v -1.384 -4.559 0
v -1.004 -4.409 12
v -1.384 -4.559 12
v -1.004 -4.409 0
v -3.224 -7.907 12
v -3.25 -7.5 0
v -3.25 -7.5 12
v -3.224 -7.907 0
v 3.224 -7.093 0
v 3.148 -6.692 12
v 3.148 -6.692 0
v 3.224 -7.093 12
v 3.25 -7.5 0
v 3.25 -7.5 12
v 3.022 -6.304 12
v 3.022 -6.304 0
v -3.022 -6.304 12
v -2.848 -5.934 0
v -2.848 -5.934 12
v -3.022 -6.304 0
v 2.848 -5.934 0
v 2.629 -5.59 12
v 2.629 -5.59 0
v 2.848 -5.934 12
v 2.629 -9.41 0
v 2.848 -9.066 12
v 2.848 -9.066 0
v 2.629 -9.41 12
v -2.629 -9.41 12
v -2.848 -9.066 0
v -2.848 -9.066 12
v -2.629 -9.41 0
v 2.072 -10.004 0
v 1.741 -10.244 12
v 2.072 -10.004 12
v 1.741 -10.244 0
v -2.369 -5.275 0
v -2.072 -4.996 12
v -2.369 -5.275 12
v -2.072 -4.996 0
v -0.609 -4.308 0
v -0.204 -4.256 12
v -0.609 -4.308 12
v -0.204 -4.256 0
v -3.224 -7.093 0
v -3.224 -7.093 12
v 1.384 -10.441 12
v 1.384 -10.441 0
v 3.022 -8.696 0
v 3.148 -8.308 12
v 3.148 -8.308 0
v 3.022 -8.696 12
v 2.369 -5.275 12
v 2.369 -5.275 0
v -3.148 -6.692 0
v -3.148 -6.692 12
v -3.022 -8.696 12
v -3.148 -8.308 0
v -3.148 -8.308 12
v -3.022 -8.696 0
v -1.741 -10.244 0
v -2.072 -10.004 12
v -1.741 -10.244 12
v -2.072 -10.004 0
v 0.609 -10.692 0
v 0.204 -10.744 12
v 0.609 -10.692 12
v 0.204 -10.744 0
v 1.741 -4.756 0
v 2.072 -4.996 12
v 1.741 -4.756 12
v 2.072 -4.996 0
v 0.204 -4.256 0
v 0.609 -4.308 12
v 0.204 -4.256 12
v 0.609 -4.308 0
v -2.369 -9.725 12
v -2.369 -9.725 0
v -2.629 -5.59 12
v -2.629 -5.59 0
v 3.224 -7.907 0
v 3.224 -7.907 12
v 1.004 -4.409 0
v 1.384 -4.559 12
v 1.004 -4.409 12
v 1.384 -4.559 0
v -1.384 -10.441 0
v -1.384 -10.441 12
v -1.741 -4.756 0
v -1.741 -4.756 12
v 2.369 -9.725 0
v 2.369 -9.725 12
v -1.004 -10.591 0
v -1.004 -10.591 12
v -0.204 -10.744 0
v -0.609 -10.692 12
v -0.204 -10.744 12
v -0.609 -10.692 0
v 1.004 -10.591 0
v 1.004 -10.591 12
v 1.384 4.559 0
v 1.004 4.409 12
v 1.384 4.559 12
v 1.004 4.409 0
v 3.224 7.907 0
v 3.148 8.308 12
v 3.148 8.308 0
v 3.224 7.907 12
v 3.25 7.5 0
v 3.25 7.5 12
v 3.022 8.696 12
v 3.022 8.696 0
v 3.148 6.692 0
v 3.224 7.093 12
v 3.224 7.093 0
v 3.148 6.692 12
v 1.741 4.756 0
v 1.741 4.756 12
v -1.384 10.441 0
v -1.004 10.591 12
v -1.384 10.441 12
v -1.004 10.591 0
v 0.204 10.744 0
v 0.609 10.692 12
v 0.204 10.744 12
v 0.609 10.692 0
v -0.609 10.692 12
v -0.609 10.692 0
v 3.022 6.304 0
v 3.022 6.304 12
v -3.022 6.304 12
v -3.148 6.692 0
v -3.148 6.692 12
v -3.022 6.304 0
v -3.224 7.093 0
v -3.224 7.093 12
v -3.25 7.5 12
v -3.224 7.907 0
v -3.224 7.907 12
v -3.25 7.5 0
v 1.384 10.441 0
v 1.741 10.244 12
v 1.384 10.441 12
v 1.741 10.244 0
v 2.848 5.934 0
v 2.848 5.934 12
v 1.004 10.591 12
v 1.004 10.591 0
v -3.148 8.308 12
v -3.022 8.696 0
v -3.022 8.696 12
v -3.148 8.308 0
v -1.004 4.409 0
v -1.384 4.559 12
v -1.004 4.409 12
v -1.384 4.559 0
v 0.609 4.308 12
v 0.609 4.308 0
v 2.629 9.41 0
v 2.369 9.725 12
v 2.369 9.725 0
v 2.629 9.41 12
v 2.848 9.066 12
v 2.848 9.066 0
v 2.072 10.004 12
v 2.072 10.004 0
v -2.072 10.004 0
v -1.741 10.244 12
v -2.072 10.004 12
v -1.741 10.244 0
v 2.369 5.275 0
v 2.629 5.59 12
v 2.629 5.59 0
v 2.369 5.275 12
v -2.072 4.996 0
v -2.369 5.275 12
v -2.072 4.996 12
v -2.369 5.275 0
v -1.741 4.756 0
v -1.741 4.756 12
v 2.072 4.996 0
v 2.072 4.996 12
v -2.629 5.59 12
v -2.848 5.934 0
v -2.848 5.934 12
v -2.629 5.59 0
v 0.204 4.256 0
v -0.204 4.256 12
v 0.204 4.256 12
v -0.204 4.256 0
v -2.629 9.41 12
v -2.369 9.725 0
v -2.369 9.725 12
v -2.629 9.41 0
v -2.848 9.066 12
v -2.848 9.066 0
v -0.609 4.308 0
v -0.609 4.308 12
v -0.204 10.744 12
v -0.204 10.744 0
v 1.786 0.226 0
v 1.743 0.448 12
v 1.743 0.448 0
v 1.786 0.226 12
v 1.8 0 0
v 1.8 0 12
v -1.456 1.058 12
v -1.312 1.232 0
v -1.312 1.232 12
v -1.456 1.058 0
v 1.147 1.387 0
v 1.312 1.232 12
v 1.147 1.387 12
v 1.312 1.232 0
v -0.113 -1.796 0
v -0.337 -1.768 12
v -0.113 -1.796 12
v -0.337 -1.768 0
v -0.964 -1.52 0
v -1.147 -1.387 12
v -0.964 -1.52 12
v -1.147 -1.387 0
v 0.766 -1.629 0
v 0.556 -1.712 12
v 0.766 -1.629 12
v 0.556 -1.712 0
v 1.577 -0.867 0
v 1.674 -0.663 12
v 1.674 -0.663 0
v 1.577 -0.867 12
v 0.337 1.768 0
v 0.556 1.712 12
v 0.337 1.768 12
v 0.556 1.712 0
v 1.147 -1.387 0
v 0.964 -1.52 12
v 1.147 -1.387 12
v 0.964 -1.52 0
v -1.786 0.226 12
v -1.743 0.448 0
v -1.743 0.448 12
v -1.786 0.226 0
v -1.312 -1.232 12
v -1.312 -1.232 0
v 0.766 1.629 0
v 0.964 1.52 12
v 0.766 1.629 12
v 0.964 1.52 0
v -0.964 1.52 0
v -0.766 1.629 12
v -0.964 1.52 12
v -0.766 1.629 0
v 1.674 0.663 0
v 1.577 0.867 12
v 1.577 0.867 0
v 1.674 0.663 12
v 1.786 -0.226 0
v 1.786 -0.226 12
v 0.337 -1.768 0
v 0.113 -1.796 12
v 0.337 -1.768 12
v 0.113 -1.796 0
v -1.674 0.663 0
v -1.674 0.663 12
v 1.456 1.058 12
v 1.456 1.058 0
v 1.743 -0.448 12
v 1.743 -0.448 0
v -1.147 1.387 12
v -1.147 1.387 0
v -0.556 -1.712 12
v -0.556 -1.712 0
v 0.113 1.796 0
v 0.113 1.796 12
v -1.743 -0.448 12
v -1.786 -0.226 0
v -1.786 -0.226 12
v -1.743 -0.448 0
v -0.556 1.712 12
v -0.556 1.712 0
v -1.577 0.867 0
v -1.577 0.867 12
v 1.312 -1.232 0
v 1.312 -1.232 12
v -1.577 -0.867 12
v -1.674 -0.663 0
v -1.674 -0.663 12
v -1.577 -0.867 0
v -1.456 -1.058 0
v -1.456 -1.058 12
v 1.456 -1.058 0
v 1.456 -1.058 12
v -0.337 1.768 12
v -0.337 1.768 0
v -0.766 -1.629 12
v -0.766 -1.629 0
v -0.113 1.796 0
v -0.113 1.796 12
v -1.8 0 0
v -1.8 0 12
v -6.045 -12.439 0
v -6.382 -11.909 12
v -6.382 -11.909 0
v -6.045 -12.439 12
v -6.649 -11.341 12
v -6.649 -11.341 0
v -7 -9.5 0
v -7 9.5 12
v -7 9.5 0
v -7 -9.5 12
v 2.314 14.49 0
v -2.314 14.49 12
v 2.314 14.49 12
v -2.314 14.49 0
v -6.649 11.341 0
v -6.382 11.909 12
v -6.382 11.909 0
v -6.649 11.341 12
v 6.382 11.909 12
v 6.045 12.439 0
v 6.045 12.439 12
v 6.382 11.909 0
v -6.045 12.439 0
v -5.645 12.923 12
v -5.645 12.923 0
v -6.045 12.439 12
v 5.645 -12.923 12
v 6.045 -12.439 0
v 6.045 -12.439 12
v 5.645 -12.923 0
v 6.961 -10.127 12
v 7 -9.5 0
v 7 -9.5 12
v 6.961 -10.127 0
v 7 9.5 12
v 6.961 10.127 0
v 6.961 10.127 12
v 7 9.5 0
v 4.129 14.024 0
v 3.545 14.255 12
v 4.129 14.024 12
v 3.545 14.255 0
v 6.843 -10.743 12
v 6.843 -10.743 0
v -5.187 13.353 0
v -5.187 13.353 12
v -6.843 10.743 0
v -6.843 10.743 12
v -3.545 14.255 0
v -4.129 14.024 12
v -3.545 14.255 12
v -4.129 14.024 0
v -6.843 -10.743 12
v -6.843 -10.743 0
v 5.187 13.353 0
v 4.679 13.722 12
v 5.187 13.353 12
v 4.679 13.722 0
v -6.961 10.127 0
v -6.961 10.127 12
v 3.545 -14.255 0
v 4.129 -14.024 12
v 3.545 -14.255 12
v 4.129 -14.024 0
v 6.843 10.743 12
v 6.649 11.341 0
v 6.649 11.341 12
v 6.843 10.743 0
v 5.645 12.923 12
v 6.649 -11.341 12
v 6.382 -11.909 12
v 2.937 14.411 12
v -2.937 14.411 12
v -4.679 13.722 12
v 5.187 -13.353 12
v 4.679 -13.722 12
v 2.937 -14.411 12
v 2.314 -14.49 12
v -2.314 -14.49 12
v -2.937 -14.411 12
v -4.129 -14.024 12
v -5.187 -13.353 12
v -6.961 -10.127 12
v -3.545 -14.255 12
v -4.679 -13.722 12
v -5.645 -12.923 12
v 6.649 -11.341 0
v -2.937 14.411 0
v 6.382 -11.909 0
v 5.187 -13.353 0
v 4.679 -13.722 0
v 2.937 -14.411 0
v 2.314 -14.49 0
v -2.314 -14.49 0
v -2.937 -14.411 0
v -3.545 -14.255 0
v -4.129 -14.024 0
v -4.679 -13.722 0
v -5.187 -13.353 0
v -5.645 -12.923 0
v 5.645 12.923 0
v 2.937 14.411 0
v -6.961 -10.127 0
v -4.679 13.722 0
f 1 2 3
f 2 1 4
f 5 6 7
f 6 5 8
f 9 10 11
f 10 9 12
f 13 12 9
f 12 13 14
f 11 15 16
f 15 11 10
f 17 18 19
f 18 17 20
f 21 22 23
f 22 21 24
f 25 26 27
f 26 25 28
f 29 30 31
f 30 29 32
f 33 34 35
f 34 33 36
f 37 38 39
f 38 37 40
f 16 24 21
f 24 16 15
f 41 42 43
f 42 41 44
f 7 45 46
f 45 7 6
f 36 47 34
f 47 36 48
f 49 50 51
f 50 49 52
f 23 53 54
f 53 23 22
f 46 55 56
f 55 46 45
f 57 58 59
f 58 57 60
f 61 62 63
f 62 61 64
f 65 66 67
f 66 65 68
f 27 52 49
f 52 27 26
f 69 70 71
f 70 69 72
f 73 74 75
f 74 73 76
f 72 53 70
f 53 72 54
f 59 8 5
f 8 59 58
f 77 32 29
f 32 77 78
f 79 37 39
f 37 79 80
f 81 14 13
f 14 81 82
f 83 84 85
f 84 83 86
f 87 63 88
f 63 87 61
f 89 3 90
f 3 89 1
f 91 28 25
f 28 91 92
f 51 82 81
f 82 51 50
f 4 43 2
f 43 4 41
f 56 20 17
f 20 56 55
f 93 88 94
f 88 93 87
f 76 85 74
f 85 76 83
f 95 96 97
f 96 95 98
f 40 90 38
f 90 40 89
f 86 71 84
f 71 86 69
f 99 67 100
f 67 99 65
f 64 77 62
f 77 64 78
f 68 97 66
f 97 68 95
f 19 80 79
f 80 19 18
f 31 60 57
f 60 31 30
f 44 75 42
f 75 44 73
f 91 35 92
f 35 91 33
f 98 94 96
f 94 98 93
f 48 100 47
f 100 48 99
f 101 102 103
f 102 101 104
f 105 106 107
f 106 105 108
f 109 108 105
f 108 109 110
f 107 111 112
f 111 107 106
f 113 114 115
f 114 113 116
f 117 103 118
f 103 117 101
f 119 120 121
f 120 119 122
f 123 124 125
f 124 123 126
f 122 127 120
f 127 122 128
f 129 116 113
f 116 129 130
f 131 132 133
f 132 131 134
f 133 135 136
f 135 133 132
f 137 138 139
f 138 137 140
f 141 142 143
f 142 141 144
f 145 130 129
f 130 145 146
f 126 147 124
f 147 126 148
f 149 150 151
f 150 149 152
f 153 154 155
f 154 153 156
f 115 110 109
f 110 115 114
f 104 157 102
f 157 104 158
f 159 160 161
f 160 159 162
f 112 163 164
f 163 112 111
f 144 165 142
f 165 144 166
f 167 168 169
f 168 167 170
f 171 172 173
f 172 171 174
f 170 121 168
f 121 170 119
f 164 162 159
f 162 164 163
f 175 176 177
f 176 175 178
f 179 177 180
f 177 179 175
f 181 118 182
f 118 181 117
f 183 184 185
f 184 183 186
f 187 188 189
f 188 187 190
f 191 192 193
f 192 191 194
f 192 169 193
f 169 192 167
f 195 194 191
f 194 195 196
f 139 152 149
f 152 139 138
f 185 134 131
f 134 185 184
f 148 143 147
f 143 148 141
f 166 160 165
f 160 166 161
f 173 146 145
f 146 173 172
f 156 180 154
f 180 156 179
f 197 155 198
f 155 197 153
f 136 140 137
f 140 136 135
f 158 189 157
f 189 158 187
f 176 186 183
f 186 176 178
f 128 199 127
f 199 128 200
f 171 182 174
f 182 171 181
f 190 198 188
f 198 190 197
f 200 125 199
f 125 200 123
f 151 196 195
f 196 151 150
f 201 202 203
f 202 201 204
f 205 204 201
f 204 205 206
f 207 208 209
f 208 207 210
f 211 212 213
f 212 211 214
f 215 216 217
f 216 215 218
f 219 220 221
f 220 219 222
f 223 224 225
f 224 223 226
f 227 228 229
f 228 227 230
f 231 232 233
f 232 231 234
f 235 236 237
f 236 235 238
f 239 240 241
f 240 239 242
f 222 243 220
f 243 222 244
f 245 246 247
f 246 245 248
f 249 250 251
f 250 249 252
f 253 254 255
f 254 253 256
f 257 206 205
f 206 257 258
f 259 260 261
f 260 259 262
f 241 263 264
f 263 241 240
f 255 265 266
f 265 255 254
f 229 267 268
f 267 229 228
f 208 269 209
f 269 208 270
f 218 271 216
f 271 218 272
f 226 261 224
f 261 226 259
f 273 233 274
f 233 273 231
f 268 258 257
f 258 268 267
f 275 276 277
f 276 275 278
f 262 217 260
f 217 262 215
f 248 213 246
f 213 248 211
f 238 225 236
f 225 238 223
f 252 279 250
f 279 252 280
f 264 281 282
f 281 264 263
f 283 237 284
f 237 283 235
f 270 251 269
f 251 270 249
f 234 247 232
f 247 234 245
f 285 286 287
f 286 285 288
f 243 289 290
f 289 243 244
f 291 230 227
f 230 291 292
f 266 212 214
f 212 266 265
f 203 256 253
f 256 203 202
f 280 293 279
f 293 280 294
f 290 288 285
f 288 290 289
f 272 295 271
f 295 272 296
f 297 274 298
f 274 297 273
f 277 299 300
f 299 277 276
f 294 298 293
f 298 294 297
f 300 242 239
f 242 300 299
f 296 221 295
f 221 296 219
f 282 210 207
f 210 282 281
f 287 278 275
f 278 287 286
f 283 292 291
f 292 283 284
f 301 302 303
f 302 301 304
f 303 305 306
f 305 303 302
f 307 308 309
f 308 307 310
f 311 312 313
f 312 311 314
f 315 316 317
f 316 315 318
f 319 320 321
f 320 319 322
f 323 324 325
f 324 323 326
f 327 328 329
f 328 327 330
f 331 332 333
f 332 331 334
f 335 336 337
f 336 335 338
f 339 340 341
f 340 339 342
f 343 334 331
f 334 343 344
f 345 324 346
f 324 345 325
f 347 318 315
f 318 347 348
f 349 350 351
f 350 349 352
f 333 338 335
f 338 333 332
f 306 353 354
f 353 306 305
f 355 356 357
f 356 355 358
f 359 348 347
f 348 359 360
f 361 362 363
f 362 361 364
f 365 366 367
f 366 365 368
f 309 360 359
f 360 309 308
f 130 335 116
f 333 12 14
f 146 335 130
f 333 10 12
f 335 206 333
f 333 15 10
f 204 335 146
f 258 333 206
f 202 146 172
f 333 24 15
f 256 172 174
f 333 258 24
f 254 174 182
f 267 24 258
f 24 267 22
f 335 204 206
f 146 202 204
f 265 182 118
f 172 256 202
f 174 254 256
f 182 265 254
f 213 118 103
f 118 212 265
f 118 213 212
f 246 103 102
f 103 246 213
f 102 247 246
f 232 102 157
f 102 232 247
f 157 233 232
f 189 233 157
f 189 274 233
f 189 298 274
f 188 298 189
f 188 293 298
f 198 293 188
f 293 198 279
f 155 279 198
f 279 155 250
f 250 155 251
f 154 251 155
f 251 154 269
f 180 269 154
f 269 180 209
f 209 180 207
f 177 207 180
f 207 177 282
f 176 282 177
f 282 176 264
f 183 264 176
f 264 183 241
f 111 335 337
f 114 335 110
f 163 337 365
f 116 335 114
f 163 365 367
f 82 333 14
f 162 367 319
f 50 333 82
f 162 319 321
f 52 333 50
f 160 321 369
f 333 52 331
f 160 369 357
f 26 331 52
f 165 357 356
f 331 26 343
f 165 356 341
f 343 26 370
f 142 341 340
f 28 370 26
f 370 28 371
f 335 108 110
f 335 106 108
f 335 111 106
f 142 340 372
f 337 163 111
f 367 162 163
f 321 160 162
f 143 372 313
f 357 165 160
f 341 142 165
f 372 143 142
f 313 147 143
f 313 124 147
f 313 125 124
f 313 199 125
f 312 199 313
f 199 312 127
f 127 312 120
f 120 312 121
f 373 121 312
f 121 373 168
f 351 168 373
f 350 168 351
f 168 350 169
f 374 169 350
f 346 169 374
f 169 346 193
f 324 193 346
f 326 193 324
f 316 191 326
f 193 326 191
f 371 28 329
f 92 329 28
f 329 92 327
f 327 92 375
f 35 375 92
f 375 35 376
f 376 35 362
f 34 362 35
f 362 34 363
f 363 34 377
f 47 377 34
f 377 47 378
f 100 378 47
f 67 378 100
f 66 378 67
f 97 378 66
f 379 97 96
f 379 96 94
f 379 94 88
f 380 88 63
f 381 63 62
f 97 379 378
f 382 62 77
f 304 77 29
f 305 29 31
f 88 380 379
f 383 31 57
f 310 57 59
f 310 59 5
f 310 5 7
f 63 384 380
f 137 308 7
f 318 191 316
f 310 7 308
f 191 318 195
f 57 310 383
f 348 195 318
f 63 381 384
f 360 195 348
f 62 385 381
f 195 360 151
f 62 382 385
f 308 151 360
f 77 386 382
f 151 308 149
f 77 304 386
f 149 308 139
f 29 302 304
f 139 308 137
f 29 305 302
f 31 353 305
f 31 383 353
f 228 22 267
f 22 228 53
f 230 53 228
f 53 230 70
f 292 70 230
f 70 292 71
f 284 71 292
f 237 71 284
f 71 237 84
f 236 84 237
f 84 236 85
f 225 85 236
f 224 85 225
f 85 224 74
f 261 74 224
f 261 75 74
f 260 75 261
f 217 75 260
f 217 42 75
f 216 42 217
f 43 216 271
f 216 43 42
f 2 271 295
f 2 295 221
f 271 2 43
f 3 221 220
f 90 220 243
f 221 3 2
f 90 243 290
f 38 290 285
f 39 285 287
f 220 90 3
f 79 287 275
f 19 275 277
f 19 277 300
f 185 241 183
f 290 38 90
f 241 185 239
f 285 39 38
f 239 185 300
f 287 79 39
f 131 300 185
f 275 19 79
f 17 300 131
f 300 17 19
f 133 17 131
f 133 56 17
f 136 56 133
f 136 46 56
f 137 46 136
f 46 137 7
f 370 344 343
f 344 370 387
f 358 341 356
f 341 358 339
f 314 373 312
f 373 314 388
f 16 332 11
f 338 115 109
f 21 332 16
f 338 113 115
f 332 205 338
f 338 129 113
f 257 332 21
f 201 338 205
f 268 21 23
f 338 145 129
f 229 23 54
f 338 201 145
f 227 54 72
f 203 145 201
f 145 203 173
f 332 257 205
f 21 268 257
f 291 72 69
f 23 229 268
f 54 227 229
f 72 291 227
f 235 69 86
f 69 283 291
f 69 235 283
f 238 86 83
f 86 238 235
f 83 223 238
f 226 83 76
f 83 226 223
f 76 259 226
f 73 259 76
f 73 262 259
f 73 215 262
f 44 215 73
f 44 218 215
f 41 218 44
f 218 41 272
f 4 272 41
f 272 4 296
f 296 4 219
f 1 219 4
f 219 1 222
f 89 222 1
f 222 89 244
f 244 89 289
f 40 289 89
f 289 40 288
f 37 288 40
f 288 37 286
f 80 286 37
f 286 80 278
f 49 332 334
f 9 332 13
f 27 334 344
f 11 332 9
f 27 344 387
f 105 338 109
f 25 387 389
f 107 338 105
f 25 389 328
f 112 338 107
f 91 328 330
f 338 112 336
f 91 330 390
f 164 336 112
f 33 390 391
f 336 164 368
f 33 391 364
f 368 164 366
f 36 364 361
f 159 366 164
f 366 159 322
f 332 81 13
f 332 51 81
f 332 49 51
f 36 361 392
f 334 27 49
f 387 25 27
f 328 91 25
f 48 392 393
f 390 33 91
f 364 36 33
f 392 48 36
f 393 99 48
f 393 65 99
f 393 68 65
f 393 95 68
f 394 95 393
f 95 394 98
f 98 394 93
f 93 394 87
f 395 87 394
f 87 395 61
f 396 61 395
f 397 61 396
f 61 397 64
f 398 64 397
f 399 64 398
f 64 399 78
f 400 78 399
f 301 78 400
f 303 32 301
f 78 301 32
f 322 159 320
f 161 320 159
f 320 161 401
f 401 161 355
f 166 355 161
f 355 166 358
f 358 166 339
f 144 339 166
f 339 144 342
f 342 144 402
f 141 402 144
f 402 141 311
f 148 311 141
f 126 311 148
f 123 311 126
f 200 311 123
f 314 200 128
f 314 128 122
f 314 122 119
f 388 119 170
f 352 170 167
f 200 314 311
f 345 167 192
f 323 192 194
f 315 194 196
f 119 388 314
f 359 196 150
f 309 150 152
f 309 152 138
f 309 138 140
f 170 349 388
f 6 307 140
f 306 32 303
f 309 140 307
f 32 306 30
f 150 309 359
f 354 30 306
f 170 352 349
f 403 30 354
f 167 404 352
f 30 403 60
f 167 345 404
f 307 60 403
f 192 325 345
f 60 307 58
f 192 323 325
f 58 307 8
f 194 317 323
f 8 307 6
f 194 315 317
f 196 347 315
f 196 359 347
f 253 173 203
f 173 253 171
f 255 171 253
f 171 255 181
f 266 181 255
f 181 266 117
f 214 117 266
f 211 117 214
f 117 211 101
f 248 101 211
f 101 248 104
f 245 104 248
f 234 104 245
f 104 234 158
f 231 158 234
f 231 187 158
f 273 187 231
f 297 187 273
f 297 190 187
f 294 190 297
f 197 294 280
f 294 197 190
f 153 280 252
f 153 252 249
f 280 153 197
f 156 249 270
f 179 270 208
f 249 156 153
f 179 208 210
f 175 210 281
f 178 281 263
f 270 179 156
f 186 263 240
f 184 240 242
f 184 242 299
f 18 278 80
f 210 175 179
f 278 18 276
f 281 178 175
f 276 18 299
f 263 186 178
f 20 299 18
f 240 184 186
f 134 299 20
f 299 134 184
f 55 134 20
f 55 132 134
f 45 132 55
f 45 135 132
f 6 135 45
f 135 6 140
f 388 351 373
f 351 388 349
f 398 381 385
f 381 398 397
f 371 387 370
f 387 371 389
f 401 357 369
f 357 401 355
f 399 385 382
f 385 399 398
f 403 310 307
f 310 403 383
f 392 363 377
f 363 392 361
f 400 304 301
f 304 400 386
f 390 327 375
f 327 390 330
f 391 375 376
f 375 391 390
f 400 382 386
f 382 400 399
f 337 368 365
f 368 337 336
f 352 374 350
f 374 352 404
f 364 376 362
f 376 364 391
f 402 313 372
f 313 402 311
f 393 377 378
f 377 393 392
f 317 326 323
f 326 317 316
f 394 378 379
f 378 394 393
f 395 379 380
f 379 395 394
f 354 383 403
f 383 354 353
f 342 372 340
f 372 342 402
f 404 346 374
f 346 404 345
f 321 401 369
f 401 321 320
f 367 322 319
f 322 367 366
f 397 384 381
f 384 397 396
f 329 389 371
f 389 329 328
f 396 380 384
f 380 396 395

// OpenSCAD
$fn = 50;

difference() {
	union() {
		hull() {
			translate(v = [-2.0, 9.5, 0]) {
				cylinder(h = 12, r = 5);
			}
			translate(v = [2.0, 9.5, 0]) {
				cylinder(h = 12, r = 5);
			}
			translate(v = [-2.0, -9.5, 0]) {
				cylinder(h = 12, r = 5);
			}
			translate(v = [2.0, -9.5, 0]) {
				cylinder(h = 12, r = 5);
			}
		}
	}
	union() {
		translate(v = [0.0, -7.5, 0]) {
			translate(v = [0, 0, -100]) {
				cylinder(h = 200, r = 3.25);
			}
		}
		translate(v = [0.0, 7.5, 0]) {
			translate(v = [0, 0, -100]) {
				cylinder(h = 200, r = 3.25);
			}
		}
		translate(v = [0.0, -7.5, 0]) {
			translate(v = [0, 0, -100]) {
				cylinder(h = 200, r = 1.8);
			}
		}
		translate(v = [0, 0, -100]) {
			cylinder(h = 200, r = 1.8);
		}
		translate(v = [0.0, 7.5, 0]) {
			translate(v = [0, 0, -100]) {
				cylinder(h = 200, r = 1.8);
			}
		}
	}
}
